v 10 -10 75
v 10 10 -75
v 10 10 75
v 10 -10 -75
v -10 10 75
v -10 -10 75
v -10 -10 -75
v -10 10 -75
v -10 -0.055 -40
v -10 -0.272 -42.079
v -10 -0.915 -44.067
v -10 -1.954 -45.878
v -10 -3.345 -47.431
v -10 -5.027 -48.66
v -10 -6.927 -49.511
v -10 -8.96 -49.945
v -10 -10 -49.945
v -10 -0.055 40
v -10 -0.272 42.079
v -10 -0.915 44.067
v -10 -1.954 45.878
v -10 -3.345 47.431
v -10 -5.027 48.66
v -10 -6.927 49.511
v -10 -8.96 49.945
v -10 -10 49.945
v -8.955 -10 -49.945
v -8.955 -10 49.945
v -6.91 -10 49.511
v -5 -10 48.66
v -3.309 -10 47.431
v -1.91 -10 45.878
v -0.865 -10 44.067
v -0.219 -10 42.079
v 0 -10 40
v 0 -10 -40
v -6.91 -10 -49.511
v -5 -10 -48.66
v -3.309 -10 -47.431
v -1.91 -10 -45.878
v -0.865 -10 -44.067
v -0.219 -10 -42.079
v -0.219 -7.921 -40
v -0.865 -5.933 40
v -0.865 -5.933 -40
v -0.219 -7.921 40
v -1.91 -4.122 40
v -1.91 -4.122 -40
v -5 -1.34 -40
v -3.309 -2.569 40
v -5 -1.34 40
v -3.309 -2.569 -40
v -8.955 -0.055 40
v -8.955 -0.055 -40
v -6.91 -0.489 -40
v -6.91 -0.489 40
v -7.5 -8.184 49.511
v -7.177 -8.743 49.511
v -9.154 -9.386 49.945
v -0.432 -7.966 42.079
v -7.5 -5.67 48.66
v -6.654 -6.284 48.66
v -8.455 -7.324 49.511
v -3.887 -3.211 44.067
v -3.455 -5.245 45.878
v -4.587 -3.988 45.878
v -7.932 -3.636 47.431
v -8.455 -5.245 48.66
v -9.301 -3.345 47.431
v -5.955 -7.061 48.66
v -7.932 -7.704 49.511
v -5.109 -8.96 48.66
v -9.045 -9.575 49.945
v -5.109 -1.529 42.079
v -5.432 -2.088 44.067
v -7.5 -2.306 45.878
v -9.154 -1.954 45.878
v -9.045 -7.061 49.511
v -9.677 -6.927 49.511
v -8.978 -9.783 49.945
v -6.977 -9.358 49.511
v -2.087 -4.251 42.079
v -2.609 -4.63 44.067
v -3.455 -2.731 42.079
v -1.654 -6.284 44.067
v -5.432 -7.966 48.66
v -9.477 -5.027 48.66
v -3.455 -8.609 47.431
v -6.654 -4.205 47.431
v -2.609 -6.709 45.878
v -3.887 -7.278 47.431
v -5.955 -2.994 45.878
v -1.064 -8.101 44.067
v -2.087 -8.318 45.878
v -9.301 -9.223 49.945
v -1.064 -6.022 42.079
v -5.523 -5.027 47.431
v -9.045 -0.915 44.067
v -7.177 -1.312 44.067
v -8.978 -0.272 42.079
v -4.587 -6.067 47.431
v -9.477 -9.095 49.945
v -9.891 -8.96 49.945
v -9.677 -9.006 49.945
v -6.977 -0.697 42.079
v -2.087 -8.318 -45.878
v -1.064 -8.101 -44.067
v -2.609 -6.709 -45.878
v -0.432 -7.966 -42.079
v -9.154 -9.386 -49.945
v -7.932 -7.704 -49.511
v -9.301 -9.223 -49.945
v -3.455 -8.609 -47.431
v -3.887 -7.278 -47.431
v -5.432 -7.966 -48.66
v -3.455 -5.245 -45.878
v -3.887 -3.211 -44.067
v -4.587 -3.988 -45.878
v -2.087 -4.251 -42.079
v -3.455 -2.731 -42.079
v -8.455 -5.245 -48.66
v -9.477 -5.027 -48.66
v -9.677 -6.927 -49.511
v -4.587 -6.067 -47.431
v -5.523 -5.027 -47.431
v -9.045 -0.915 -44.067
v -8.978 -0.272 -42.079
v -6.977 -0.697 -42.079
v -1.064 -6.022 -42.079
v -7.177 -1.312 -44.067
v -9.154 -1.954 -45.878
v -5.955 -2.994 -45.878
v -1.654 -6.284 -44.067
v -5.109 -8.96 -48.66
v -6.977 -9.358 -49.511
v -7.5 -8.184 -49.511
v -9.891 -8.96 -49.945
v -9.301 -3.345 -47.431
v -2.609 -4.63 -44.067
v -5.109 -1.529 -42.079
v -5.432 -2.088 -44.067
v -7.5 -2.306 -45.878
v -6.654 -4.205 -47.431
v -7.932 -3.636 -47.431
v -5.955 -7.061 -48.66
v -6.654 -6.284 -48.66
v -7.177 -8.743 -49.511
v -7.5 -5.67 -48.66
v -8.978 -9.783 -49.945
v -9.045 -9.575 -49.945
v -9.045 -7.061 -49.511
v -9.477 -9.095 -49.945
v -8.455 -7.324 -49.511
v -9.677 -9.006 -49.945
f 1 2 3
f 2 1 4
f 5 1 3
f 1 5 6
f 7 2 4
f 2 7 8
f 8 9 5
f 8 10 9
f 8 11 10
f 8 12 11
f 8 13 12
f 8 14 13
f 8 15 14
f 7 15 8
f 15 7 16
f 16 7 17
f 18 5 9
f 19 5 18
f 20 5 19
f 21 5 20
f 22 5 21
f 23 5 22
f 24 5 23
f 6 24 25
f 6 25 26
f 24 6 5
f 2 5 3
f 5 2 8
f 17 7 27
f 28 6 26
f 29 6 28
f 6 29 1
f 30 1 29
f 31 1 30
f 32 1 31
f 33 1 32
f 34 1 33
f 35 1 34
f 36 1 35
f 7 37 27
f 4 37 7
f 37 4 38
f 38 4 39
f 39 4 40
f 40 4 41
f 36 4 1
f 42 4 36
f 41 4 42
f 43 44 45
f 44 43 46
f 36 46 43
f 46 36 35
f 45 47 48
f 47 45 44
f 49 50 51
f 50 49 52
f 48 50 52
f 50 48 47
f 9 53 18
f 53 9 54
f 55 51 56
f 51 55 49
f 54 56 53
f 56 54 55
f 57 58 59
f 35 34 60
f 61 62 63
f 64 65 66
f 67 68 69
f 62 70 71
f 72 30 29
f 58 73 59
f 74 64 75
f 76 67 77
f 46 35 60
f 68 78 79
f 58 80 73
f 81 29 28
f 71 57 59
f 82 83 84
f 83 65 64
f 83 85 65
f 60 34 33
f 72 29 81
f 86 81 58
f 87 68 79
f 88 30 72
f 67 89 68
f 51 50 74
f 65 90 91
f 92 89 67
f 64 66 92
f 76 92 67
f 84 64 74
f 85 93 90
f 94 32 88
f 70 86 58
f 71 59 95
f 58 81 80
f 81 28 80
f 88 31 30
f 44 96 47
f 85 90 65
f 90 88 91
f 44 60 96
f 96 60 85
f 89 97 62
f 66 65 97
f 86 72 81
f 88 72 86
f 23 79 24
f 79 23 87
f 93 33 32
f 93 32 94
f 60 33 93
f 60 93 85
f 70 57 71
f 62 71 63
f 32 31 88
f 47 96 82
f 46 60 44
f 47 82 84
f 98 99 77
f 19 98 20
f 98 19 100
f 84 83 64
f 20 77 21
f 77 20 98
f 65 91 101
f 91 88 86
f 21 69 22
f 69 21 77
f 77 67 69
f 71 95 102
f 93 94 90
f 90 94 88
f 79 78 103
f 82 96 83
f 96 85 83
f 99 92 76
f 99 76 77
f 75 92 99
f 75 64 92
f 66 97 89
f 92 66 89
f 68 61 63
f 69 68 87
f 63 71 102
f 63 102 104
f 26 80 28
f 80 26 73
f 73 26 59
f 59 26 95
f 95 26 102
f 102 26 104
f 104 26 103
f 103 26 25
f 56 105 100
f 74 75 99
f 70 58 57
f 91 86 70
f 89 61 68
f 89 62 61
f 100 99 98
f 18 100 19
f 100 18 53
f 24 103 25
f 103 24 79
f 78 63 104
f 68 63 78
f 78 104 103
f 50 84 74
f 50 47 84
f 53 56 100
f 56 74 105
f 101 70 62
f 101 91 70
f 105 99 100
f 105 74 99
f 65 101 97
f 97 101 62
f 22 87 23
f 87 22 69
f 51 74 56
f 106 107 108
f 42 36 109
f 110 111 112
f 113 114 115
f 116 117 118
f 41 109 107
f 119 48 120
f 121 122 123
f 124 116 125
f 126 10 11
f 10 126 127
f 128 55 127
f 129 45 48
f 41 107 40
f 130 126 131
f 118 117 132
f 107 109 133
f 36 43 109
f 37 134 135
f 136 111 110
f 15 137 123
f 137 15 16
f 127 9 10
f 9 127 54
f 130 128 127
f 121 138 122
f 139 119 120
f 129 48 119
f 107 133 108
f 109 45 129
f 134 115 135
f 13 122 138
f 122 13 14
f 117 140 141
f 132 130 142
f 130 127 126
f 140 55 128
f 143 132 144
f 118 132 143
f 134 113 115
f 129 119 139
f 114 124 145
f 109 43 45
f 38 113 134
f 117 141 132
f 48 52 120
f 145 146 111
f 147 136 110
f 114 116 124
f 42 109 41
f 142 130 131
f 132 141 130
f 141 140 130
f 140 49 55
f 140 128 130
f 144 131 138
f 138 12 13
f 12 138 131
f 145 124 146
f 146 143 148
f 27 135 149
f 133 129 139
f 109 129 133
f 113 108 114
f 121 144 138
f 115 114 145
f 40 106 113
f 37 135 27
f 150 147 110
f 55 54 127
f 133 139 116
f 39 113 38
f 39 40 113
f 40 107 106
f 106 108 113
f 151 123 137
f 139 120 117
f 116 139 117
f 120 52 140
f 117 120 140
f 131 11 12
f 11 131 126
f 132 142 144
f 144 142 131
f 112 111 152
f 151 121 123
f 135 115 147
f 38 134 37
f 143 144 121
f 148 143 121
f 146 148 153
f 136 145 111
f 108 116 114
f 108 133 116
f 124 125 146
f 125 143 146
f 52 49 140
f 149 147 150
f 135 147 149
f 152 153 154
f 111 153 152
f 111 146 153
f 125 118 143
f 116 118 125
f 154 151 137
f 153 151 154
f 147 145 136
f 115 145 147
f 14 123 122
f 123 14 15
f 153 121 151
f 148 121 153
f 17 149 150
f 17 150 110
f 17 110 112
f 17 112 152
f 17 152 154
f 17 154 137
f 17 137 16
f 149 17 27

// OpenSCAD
render(convexity = 2) difference() {
 cube([20, 20, 150], center = true);
 translate([-10, -10, 0])
  cylinder(h = 80, r = 10, center = true);
 translate([-10, -10, +40])
  sphere(r = 10);
 translate([-10, -10, -40])
  sphere(r = 10);
}
